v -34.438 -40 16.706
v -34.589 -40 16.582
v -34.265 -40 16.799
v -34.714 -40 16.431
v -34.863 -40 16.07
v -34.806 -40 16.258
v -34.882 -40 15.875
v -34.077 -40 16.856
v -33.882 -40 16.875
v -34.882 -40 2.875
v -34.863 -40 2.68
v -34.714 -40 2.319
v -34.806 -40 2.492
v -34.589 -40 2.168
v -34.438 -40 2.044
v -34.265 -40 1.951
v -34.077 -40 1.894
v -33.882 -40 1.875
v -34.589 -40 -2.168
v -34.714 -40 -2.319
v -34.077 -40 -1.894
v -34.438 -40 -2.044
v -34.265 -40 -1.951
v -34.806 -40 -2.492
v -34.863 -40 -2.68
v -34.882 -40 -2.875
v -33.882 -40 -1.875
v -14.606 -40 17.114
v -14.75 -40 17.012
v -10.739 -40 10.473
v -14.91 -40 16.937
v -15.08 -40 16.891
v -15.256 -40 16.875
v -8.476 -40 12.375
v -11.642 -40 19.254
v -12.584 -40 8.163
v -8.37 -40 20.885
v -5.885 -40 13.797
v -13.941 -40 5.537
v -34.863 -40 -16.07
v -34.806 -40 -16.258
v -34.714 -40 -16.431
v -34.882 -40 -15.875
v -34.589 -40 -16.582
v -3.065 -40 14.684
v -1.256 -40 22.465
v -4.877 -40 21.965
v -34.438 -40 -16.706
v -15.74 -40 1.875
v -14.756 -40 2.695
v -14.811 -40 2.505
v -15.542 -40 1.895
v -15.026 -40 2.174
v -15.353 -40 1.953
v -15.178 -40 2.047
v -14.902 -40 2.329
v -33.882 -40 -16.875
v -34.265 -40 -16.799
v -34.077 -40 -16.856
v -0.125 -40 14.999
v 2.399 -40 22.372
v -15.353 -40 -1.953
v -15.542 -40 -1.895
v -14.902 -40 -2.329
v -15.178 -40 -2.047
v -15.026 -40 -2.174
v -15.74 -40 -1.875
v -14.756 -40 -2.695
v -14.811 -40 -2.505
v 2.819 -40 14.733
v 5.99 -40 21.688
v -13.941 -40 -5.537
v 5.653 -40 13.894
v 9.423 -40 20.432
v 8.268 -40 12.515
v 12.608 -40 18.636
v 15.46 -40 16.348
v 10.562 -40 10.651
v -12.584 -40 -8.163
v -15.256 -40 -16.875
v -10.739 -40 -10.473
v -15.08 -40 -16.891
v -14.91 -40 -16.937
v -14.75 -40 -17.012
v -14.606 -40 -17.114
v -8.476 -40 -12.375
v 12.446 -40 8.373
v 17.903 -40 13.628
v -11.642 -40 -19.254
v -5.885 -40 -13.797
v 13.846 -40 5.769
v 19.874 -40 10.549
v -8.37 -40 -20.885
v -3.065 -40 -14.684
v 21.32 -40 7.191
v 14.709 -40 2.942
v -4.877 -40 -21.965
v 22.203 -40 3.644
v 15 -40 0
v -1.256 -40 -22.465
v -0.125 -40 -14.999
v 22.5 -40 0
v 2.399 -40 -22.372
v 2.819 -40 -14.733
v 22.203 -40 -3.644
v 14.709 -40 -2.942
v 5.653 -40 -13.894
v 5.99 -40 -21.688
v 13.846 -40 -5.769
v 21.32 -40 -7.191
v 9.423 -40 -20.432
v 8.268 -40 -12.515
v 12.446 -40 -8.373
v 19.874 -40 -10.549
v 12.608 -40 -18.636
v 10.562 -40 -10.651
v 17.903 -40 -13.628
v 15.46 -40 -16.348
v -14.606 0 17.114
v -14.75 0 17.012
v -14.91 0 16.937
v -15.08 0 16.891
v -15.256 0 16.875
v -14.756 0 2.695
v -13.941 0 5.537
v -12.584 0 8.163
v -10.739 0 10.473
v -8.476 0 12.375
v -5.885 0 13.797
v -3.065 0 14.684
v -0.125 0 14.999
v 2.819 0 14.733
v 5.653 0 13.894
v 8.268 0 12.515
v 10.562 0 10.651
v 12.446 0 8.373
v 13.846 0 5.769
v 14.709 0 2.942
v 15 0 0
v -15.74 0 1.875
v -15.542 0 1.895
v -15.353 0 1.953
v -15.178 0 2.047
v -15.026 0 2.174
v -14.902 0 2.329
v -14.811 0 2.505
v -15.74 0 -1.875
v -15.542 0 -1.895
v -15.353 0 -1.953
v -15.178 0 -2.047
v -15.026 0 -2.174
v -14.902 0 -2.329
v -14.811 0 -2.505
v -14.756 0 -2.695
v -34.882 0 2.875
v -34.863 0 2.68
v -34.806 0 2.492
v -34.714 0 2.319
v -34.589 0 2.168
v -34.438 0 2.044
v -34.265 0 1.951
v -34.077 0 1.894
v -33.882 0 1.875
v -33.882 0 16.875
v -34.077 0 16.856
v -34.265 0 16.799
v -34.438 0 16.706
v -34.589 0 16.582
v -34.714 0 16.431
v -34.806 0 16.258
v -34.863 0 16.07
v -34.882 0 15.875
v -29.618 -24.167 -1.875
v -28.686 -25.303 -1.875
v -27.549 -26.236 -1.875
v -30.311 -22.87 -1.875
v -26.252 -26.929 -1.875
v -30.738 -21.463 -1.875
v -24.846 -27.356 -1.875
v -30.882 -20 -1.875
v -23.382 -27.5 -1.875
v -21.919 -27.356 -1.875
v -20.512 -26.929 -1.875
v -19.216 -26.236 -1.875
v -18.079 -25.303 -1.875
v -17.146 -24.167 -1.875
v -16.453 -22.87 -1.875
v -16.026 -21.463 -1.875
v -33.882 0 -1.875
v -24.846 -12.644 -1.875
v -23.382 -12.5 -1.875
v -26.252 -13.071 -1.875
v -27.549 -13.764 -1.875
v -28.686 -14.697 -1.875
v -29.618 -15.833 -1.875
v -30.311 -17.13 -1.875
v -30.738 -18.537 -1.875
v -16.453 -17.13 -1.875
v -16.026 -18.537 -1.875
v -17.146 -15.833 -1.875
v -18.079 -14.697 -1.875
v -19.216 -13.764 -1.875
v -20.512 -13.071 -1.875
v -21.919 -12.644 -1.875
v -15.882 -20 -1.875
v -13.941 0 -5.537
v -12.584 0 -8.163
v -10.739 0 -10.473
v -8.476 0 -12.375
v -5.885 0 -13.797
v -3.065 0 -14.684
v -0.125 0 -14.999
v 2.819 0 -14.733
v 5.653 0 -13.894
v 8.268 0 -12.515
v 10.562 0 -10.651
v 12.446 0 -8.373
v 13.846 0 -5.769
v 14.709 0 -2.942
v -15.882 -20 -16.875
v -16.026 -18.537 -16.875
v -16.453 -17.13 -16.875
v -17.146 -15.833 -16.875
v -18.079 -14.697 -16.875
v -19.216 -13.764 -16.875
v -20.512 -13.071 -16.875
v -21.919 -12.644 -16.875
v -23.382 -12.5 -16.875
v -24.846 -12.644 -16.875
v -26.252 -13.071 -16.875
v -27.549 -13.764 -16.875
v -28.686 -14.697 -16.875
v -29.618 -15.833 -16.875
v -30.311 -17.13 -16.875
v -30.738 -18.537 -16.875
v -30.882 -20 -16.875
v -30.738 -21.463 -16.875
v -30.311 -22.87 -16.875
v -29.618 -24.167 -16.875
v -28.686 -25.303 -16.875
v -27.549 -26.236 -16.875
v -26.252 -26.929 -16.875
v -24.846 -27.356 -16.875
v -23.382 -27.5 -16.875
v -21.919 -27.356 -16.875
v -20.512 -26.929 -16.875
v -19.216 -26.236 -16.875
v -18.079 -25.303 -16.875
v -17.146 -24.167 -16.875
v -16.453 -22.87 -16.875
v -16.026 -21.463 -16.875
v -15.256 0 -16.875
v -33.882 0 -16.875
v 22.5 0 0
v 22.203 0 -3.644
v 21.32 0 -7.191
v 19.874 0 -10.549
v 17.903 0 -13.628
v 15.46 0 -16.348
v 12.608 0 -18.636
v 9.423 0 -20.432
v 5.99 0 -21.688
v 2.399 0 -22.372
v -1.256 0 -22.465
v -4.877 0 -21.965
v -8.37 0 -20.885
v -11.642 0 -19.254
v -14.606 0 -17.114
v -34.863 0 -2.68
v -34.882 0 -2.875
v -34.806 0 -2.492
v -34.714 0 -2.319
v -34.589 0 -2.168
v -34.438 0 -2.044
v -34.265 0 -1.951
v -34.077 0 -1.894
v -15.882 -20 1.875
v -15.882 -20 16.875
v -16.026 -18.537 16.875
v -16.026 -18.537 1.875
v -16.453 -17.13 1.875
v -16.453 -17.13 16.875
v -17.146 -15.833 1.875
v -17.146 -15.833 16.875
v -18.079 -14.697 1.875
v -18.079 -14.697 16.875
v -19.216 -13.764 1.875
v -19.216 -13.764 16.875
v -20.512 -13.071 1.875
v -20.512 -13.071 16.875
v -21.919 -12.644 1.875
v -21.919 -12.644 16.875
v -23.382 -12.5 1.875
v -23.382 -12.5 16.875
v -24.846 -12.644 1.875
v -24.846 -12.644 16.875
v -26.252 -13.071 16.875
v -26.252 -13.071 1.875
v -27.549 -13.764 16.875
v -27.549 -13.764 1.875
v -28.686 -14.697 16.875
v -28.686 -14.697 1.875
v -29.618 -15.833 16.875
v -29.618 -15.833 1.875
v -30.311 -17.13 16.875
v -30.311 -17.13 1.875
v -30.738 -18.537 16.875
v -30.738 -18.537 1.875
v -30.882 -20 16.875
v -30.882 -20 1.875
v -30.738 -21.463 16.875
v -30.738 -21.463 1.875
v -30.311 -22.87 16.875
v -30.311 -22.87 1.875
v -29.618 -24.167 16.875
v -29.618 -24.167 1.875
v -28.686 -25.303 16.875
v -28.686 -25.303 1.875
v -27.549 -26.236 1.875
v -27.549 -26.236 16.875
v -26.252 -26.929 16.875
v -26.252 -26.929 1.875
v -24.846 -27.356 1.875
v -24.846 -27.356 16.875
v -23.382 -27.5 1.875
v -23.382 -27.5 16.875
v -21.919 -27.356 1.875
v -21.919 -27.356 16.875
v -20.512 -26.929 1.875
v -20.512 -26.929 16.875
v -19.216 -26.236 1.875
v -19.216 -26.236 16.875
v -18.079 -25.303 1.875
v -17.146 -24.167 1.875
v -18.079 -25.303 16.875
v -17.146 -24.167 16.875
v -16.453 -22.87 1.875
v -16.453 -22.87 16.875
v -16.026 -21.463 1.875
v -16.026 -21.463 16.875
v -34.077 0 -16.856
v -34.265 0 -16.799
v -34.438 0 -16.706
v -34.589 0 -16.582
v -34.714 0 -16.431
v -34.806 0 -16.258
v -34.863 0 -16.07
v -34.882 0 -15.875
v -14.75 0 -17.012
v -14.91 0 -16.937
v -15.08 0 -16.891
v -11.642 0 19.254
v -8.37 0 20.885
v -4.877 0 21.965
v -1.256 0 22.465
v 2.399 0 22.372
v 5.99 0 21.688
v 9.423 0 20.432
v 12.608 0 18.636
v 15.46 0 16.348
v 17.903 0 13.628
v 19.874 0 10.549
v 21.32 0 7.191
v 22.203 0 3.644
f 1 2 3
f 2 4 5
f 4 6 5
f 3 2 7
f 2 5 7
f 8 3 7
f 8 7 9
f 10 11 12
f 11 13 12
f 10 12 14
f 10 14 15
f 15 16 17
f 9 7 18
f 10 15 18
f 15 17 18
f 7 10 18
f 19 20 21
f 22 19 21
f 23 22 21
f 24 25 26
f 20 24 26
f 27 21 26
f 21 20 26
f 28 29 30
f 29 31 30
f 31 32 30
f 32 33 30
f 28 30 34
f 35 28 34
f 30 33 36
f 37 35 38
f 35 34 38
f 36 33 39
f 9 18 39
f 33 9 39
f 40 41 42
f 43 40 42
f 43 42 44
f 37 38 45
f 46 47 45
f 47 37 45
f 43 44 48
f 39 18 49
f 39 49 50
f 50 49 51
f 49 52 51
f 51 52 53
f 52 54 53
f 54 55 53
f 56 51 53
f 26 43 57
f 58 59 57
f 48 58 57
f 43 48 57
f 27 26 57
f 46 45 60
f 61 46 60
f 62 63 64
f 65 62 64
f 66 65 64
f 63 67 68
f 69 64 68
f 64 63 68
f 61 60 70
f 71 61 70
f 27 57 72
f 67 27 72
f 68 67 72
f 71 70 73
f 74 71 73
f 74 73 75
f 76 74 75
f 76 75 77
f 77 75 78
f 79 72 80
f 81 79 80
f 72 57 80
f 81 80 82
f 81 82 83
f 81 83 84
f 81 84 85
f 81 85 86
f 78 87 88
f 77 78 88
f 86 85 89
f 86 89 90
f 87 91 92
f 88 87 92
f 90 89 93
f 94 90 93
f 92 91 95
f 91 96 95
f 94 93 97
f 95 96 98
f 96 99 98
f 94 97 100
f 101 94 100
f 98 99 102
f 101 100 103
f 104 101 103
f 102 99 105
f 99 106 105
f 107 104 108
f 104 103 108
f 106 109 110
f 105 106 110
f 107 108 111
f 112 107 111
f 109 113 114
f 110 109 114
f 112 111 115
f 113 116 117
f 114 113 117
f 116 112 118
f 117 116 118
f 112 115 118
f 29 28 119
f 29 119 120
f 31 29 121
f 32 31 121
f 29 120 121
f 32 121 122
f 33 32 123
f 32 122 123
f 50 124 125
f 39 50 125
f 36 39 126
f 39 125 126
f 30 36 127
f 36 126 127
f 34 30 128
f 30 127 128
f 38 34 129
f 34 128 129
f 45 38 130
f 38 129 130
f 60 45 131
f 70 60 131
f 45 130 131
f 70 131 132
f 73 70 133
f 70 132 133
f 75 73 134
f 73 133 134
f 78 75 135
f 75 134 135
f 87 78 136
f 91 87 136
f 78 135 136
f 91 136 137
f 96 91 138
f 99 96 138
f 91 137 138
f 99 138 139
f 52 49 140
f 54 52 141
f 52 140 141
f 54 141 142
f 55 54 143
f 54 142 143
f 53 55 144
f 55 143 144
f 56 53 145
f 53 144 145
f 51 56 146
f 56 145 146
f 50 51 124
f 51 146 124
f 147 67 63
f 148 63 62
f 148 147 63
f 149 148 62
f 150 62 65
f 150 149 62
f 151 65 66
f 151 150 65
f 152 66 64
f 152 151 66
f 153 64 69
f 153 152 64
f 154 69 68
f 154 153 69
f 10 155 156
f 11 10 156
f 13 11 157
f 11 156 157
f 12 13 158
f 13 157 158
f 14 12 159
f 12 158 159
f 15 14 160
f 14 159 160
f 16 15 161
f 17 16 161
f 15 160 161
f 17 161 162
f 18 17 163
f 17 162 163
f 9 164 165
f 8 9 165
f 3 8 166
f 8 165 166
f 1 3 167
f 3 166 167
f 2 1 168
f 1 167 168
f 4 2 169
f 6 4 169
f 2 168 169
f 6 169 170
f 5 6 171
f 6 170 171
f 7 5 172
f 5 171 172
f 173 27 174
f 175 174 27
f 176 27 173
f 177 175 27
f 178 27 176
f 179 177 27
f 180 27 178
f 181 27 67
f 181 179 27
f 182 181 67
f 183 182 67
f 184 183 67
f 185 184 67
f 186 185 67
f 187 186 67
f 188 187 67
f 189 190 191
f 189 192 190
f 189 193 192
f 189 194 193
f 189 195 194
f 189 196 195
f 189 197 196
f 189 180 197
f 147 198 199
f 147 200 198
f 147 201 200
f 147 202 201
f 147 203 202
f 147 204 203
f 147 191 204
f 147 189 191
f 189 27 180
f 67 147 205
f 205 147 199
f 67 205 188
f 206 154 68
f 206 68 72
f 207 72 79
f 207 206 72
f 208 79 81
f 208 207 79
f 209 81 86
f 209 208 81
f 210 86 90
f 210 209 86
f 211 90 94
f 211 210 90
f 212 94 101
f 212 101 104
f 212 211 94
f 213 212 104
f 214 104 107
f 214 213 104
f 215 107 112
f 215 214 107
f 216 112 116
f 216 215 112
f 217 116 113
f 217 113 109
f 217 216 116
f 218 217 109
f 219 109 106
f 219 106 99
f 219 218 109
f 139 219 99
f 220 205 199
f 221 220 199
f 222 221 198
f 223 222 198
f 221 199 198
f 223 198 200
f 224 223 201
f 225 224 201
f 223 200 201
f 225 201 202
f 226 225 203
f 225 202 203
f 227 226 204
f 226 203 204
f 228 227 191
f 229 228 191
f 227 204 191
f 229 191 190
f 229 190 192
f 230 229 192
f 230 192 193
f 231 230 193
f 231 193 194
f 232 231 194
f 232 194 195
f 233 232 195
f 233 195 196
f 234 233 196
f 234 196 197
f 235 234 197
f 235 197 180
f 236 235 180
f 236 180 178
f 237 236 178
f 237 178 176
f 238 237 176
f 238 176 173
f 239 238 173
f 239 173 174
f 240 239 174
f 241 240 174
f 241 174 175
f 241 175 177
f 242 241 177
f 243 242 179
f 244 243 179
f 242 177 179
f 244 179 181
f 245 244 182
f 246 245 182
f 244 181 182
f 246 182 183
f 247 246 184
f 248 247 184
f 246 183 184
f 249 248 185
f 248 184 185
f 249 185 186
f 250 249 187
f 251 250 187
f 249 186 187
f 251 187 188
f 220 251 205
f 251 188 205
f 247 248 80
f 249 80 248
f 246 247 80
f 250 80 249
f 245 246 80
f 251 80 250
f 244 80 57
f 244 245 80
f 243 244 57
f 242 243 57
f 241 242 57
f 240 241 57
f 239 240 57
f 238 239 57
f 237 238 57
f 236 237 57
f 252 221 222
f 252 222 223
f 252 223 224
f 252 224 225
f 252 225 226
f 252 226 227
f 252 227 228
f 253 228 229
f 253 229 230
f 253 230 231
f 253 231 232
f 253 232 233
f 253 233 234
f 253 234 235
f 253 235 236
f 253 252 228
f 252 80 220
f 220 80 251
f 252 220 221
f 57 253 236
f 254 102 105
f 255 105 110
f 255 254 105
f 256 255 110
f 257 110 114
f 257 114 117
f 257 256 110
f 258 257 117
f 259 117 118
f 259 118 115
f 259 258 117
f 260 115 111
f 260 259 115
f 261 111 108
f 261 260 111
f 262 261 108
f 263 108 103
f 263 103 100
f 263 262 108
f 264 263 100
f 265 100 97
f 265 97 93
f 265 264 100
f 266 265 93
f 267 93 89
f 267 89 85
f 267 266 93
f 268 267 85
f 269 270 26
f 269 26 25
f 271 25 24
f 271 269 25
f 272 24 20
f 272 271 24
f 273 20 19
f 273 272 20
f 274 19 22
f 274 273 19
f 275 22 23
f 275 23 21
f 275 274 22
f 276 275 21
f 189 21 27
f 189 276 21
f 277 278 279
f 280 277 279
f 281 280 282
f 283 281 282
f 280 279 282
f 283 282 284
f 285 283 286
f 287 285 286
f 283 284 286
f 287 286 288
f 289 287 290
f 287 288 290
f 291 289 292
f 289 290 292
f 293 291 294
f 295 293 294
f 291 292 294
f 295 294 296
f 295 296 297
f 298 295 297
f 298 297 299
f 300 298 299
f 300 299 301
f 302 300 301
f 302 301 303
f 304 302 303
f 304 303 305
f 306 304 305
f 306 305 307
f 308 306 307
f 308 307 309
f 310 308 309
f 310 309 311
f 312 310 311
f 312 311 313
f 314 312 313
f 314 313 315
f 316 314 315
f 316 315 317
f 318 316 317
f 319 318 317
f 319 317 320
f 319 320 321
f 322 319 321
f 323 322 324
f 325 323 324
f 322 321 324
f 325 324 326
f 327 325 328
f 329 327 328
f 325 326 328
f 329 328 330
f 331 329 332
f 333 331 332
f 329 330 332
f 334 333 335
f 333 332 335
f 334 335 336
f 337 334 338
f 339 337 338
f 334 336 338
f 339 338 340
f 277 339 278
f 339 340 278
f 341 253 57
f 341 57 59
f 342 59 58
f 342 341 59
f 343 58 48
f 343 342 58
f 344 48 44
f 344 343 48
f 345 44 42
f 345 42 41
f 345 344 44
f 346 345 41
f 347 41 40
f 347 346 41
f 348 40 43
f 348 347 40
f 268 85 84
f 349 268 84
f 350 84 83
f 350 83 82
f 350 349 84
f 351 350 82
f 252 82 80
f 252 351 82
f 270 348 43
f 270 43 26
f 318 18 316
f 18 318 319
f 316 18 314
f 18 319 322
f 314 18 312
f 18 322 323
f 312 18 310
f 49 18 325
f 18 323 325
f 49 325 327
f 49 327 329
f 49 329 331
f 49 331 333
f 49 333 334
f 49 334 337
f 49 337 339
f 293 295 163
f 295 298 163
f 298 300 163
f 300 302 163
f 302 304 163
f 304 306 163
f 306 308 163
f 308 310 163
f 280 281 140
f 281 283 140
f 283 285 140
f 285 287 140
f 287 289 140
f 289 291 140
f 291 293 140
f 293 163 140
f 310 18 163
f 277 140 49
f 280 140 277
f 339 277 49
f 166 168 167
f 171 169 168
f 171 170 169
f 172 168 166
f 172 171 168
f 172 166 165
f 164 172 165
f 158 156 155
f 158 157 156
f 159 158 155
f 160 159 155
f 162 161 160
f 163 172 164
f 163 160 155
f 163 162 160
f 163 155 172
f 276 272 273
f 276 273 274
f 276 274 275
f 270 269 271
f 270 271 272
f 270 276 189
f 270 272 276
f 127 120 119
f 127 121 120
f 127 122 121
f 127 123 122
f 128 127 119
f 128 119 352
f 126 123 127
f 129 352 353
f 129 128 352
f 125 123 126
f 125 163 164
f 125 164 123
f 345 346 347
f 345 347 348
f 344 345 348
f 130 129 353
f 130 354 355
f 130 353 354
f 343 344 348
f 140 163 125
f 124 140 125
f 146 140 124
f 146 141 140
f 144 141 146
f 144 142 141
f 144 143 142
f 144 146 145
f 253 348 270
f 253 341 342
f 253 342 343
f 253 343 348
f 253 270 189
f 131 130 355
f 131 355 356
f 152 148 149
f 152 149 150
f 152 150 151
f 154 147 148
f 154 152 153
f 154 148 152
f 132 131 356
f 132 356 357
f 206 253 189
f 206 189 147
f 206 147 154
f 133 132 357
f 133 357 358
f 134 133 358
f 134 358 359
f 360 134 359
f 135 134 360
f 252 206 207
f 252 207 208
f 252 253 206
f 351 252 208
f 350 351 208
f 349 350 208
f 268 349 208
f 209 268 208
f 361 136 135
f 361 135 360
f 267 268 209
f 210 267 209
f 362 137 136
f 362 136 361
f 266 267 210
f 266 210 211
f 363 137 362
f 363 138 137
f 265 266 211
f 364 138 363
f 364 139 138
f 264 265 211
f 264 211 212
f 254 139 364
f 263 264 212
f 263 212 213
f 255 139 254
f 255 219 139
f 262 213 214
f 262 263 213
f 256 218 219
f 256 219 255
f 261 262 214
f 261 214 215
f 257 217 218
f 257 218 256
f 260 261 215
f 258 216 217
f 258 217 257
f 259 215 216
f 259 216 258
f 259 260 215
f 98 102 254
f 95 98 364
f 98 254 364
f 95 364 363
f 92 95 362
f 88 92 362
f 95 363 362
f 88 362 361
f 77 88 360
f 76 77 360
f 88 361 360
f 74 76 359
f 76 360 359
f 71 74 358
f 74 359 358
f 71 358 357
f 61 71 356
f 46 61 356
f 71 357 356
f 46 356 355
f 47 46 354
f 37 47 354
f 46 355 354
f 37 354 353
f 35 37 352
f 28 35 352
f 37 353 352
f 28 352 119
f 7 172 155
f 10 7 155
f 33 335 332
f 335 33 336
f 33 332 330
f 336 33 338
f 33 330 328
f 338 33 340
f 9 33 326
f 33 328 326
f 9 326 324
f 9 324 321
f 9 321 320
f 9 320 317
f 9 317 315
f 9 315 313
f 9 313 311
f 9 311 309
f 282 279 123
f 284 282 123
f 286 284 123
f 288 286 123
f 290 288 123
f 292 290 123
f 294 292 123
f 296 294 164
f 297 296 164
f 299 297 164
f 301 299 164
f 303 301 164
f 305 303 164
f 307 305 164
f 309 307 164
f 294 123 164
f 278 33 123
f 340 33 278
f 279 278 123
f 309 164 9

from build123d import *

# Parameters (mm, degrees)
F1_DEPTH = 40
F3_R     = 7.5
F4_DEPTH = 45


with BuildPart() as f1:
    # F0 (on Front) → F1 (new body)
    with BuildSketch(Plane.XZ):
        with BuildLine():
            Line((-34.882351, 15.875), (-34.882351, 2.875))
            ThreePointArc((-34.882351, 2.875), (-34.589458, 2.167893), (-33.882351, 1.875))
            Line((-33.882351, 1.875), (-15.73958, 1.875))
            ThreePointArc((-15.73958, 1.875), (-15.099145, 2.106987), (-14.755856, 2.695313))
            ThreePointArc((-14.755856, 2.695313), (1.353174, 14.938839), (15, 0))
            Line((15, 0), (22.5, 0))
            ThreePointArc((22.5, 0), (9.4235, 20.431536), (-14.606458, 17.114362))
            ThreePointArc((-14.606458, 17.114362), (-14.909685, 16.936747), (-15.255634, 16.875))
            Line((-15.255634, 16.875), (-33.882351, 16.875))
            ThreePointArc((-33.882351, 16.875), (-34.589458, 16.582107), (-34.882351, 15.875))
        make_face()
    extrude(amount=F1_DEPTH)

    # F2: F1 across face


with BuildPart() as f1_1:
    add(f1.part)
    add(f1.part.mirror(Plane(origin=(18.75, -20, 0), x_dir=(1, 0, 0), z_dir=(0, 0, -1))))

    # F3 (on face) → F4 (cut)
    with BuildSketch(Plane.XY.offset(16.875)):
        with Locations((-23.382351, -20)):
            Circle(F3_R)
    extrude(amount=-F4_DEPTH, mode=Mode.SUBTRACT)


solid = f1_1.part
